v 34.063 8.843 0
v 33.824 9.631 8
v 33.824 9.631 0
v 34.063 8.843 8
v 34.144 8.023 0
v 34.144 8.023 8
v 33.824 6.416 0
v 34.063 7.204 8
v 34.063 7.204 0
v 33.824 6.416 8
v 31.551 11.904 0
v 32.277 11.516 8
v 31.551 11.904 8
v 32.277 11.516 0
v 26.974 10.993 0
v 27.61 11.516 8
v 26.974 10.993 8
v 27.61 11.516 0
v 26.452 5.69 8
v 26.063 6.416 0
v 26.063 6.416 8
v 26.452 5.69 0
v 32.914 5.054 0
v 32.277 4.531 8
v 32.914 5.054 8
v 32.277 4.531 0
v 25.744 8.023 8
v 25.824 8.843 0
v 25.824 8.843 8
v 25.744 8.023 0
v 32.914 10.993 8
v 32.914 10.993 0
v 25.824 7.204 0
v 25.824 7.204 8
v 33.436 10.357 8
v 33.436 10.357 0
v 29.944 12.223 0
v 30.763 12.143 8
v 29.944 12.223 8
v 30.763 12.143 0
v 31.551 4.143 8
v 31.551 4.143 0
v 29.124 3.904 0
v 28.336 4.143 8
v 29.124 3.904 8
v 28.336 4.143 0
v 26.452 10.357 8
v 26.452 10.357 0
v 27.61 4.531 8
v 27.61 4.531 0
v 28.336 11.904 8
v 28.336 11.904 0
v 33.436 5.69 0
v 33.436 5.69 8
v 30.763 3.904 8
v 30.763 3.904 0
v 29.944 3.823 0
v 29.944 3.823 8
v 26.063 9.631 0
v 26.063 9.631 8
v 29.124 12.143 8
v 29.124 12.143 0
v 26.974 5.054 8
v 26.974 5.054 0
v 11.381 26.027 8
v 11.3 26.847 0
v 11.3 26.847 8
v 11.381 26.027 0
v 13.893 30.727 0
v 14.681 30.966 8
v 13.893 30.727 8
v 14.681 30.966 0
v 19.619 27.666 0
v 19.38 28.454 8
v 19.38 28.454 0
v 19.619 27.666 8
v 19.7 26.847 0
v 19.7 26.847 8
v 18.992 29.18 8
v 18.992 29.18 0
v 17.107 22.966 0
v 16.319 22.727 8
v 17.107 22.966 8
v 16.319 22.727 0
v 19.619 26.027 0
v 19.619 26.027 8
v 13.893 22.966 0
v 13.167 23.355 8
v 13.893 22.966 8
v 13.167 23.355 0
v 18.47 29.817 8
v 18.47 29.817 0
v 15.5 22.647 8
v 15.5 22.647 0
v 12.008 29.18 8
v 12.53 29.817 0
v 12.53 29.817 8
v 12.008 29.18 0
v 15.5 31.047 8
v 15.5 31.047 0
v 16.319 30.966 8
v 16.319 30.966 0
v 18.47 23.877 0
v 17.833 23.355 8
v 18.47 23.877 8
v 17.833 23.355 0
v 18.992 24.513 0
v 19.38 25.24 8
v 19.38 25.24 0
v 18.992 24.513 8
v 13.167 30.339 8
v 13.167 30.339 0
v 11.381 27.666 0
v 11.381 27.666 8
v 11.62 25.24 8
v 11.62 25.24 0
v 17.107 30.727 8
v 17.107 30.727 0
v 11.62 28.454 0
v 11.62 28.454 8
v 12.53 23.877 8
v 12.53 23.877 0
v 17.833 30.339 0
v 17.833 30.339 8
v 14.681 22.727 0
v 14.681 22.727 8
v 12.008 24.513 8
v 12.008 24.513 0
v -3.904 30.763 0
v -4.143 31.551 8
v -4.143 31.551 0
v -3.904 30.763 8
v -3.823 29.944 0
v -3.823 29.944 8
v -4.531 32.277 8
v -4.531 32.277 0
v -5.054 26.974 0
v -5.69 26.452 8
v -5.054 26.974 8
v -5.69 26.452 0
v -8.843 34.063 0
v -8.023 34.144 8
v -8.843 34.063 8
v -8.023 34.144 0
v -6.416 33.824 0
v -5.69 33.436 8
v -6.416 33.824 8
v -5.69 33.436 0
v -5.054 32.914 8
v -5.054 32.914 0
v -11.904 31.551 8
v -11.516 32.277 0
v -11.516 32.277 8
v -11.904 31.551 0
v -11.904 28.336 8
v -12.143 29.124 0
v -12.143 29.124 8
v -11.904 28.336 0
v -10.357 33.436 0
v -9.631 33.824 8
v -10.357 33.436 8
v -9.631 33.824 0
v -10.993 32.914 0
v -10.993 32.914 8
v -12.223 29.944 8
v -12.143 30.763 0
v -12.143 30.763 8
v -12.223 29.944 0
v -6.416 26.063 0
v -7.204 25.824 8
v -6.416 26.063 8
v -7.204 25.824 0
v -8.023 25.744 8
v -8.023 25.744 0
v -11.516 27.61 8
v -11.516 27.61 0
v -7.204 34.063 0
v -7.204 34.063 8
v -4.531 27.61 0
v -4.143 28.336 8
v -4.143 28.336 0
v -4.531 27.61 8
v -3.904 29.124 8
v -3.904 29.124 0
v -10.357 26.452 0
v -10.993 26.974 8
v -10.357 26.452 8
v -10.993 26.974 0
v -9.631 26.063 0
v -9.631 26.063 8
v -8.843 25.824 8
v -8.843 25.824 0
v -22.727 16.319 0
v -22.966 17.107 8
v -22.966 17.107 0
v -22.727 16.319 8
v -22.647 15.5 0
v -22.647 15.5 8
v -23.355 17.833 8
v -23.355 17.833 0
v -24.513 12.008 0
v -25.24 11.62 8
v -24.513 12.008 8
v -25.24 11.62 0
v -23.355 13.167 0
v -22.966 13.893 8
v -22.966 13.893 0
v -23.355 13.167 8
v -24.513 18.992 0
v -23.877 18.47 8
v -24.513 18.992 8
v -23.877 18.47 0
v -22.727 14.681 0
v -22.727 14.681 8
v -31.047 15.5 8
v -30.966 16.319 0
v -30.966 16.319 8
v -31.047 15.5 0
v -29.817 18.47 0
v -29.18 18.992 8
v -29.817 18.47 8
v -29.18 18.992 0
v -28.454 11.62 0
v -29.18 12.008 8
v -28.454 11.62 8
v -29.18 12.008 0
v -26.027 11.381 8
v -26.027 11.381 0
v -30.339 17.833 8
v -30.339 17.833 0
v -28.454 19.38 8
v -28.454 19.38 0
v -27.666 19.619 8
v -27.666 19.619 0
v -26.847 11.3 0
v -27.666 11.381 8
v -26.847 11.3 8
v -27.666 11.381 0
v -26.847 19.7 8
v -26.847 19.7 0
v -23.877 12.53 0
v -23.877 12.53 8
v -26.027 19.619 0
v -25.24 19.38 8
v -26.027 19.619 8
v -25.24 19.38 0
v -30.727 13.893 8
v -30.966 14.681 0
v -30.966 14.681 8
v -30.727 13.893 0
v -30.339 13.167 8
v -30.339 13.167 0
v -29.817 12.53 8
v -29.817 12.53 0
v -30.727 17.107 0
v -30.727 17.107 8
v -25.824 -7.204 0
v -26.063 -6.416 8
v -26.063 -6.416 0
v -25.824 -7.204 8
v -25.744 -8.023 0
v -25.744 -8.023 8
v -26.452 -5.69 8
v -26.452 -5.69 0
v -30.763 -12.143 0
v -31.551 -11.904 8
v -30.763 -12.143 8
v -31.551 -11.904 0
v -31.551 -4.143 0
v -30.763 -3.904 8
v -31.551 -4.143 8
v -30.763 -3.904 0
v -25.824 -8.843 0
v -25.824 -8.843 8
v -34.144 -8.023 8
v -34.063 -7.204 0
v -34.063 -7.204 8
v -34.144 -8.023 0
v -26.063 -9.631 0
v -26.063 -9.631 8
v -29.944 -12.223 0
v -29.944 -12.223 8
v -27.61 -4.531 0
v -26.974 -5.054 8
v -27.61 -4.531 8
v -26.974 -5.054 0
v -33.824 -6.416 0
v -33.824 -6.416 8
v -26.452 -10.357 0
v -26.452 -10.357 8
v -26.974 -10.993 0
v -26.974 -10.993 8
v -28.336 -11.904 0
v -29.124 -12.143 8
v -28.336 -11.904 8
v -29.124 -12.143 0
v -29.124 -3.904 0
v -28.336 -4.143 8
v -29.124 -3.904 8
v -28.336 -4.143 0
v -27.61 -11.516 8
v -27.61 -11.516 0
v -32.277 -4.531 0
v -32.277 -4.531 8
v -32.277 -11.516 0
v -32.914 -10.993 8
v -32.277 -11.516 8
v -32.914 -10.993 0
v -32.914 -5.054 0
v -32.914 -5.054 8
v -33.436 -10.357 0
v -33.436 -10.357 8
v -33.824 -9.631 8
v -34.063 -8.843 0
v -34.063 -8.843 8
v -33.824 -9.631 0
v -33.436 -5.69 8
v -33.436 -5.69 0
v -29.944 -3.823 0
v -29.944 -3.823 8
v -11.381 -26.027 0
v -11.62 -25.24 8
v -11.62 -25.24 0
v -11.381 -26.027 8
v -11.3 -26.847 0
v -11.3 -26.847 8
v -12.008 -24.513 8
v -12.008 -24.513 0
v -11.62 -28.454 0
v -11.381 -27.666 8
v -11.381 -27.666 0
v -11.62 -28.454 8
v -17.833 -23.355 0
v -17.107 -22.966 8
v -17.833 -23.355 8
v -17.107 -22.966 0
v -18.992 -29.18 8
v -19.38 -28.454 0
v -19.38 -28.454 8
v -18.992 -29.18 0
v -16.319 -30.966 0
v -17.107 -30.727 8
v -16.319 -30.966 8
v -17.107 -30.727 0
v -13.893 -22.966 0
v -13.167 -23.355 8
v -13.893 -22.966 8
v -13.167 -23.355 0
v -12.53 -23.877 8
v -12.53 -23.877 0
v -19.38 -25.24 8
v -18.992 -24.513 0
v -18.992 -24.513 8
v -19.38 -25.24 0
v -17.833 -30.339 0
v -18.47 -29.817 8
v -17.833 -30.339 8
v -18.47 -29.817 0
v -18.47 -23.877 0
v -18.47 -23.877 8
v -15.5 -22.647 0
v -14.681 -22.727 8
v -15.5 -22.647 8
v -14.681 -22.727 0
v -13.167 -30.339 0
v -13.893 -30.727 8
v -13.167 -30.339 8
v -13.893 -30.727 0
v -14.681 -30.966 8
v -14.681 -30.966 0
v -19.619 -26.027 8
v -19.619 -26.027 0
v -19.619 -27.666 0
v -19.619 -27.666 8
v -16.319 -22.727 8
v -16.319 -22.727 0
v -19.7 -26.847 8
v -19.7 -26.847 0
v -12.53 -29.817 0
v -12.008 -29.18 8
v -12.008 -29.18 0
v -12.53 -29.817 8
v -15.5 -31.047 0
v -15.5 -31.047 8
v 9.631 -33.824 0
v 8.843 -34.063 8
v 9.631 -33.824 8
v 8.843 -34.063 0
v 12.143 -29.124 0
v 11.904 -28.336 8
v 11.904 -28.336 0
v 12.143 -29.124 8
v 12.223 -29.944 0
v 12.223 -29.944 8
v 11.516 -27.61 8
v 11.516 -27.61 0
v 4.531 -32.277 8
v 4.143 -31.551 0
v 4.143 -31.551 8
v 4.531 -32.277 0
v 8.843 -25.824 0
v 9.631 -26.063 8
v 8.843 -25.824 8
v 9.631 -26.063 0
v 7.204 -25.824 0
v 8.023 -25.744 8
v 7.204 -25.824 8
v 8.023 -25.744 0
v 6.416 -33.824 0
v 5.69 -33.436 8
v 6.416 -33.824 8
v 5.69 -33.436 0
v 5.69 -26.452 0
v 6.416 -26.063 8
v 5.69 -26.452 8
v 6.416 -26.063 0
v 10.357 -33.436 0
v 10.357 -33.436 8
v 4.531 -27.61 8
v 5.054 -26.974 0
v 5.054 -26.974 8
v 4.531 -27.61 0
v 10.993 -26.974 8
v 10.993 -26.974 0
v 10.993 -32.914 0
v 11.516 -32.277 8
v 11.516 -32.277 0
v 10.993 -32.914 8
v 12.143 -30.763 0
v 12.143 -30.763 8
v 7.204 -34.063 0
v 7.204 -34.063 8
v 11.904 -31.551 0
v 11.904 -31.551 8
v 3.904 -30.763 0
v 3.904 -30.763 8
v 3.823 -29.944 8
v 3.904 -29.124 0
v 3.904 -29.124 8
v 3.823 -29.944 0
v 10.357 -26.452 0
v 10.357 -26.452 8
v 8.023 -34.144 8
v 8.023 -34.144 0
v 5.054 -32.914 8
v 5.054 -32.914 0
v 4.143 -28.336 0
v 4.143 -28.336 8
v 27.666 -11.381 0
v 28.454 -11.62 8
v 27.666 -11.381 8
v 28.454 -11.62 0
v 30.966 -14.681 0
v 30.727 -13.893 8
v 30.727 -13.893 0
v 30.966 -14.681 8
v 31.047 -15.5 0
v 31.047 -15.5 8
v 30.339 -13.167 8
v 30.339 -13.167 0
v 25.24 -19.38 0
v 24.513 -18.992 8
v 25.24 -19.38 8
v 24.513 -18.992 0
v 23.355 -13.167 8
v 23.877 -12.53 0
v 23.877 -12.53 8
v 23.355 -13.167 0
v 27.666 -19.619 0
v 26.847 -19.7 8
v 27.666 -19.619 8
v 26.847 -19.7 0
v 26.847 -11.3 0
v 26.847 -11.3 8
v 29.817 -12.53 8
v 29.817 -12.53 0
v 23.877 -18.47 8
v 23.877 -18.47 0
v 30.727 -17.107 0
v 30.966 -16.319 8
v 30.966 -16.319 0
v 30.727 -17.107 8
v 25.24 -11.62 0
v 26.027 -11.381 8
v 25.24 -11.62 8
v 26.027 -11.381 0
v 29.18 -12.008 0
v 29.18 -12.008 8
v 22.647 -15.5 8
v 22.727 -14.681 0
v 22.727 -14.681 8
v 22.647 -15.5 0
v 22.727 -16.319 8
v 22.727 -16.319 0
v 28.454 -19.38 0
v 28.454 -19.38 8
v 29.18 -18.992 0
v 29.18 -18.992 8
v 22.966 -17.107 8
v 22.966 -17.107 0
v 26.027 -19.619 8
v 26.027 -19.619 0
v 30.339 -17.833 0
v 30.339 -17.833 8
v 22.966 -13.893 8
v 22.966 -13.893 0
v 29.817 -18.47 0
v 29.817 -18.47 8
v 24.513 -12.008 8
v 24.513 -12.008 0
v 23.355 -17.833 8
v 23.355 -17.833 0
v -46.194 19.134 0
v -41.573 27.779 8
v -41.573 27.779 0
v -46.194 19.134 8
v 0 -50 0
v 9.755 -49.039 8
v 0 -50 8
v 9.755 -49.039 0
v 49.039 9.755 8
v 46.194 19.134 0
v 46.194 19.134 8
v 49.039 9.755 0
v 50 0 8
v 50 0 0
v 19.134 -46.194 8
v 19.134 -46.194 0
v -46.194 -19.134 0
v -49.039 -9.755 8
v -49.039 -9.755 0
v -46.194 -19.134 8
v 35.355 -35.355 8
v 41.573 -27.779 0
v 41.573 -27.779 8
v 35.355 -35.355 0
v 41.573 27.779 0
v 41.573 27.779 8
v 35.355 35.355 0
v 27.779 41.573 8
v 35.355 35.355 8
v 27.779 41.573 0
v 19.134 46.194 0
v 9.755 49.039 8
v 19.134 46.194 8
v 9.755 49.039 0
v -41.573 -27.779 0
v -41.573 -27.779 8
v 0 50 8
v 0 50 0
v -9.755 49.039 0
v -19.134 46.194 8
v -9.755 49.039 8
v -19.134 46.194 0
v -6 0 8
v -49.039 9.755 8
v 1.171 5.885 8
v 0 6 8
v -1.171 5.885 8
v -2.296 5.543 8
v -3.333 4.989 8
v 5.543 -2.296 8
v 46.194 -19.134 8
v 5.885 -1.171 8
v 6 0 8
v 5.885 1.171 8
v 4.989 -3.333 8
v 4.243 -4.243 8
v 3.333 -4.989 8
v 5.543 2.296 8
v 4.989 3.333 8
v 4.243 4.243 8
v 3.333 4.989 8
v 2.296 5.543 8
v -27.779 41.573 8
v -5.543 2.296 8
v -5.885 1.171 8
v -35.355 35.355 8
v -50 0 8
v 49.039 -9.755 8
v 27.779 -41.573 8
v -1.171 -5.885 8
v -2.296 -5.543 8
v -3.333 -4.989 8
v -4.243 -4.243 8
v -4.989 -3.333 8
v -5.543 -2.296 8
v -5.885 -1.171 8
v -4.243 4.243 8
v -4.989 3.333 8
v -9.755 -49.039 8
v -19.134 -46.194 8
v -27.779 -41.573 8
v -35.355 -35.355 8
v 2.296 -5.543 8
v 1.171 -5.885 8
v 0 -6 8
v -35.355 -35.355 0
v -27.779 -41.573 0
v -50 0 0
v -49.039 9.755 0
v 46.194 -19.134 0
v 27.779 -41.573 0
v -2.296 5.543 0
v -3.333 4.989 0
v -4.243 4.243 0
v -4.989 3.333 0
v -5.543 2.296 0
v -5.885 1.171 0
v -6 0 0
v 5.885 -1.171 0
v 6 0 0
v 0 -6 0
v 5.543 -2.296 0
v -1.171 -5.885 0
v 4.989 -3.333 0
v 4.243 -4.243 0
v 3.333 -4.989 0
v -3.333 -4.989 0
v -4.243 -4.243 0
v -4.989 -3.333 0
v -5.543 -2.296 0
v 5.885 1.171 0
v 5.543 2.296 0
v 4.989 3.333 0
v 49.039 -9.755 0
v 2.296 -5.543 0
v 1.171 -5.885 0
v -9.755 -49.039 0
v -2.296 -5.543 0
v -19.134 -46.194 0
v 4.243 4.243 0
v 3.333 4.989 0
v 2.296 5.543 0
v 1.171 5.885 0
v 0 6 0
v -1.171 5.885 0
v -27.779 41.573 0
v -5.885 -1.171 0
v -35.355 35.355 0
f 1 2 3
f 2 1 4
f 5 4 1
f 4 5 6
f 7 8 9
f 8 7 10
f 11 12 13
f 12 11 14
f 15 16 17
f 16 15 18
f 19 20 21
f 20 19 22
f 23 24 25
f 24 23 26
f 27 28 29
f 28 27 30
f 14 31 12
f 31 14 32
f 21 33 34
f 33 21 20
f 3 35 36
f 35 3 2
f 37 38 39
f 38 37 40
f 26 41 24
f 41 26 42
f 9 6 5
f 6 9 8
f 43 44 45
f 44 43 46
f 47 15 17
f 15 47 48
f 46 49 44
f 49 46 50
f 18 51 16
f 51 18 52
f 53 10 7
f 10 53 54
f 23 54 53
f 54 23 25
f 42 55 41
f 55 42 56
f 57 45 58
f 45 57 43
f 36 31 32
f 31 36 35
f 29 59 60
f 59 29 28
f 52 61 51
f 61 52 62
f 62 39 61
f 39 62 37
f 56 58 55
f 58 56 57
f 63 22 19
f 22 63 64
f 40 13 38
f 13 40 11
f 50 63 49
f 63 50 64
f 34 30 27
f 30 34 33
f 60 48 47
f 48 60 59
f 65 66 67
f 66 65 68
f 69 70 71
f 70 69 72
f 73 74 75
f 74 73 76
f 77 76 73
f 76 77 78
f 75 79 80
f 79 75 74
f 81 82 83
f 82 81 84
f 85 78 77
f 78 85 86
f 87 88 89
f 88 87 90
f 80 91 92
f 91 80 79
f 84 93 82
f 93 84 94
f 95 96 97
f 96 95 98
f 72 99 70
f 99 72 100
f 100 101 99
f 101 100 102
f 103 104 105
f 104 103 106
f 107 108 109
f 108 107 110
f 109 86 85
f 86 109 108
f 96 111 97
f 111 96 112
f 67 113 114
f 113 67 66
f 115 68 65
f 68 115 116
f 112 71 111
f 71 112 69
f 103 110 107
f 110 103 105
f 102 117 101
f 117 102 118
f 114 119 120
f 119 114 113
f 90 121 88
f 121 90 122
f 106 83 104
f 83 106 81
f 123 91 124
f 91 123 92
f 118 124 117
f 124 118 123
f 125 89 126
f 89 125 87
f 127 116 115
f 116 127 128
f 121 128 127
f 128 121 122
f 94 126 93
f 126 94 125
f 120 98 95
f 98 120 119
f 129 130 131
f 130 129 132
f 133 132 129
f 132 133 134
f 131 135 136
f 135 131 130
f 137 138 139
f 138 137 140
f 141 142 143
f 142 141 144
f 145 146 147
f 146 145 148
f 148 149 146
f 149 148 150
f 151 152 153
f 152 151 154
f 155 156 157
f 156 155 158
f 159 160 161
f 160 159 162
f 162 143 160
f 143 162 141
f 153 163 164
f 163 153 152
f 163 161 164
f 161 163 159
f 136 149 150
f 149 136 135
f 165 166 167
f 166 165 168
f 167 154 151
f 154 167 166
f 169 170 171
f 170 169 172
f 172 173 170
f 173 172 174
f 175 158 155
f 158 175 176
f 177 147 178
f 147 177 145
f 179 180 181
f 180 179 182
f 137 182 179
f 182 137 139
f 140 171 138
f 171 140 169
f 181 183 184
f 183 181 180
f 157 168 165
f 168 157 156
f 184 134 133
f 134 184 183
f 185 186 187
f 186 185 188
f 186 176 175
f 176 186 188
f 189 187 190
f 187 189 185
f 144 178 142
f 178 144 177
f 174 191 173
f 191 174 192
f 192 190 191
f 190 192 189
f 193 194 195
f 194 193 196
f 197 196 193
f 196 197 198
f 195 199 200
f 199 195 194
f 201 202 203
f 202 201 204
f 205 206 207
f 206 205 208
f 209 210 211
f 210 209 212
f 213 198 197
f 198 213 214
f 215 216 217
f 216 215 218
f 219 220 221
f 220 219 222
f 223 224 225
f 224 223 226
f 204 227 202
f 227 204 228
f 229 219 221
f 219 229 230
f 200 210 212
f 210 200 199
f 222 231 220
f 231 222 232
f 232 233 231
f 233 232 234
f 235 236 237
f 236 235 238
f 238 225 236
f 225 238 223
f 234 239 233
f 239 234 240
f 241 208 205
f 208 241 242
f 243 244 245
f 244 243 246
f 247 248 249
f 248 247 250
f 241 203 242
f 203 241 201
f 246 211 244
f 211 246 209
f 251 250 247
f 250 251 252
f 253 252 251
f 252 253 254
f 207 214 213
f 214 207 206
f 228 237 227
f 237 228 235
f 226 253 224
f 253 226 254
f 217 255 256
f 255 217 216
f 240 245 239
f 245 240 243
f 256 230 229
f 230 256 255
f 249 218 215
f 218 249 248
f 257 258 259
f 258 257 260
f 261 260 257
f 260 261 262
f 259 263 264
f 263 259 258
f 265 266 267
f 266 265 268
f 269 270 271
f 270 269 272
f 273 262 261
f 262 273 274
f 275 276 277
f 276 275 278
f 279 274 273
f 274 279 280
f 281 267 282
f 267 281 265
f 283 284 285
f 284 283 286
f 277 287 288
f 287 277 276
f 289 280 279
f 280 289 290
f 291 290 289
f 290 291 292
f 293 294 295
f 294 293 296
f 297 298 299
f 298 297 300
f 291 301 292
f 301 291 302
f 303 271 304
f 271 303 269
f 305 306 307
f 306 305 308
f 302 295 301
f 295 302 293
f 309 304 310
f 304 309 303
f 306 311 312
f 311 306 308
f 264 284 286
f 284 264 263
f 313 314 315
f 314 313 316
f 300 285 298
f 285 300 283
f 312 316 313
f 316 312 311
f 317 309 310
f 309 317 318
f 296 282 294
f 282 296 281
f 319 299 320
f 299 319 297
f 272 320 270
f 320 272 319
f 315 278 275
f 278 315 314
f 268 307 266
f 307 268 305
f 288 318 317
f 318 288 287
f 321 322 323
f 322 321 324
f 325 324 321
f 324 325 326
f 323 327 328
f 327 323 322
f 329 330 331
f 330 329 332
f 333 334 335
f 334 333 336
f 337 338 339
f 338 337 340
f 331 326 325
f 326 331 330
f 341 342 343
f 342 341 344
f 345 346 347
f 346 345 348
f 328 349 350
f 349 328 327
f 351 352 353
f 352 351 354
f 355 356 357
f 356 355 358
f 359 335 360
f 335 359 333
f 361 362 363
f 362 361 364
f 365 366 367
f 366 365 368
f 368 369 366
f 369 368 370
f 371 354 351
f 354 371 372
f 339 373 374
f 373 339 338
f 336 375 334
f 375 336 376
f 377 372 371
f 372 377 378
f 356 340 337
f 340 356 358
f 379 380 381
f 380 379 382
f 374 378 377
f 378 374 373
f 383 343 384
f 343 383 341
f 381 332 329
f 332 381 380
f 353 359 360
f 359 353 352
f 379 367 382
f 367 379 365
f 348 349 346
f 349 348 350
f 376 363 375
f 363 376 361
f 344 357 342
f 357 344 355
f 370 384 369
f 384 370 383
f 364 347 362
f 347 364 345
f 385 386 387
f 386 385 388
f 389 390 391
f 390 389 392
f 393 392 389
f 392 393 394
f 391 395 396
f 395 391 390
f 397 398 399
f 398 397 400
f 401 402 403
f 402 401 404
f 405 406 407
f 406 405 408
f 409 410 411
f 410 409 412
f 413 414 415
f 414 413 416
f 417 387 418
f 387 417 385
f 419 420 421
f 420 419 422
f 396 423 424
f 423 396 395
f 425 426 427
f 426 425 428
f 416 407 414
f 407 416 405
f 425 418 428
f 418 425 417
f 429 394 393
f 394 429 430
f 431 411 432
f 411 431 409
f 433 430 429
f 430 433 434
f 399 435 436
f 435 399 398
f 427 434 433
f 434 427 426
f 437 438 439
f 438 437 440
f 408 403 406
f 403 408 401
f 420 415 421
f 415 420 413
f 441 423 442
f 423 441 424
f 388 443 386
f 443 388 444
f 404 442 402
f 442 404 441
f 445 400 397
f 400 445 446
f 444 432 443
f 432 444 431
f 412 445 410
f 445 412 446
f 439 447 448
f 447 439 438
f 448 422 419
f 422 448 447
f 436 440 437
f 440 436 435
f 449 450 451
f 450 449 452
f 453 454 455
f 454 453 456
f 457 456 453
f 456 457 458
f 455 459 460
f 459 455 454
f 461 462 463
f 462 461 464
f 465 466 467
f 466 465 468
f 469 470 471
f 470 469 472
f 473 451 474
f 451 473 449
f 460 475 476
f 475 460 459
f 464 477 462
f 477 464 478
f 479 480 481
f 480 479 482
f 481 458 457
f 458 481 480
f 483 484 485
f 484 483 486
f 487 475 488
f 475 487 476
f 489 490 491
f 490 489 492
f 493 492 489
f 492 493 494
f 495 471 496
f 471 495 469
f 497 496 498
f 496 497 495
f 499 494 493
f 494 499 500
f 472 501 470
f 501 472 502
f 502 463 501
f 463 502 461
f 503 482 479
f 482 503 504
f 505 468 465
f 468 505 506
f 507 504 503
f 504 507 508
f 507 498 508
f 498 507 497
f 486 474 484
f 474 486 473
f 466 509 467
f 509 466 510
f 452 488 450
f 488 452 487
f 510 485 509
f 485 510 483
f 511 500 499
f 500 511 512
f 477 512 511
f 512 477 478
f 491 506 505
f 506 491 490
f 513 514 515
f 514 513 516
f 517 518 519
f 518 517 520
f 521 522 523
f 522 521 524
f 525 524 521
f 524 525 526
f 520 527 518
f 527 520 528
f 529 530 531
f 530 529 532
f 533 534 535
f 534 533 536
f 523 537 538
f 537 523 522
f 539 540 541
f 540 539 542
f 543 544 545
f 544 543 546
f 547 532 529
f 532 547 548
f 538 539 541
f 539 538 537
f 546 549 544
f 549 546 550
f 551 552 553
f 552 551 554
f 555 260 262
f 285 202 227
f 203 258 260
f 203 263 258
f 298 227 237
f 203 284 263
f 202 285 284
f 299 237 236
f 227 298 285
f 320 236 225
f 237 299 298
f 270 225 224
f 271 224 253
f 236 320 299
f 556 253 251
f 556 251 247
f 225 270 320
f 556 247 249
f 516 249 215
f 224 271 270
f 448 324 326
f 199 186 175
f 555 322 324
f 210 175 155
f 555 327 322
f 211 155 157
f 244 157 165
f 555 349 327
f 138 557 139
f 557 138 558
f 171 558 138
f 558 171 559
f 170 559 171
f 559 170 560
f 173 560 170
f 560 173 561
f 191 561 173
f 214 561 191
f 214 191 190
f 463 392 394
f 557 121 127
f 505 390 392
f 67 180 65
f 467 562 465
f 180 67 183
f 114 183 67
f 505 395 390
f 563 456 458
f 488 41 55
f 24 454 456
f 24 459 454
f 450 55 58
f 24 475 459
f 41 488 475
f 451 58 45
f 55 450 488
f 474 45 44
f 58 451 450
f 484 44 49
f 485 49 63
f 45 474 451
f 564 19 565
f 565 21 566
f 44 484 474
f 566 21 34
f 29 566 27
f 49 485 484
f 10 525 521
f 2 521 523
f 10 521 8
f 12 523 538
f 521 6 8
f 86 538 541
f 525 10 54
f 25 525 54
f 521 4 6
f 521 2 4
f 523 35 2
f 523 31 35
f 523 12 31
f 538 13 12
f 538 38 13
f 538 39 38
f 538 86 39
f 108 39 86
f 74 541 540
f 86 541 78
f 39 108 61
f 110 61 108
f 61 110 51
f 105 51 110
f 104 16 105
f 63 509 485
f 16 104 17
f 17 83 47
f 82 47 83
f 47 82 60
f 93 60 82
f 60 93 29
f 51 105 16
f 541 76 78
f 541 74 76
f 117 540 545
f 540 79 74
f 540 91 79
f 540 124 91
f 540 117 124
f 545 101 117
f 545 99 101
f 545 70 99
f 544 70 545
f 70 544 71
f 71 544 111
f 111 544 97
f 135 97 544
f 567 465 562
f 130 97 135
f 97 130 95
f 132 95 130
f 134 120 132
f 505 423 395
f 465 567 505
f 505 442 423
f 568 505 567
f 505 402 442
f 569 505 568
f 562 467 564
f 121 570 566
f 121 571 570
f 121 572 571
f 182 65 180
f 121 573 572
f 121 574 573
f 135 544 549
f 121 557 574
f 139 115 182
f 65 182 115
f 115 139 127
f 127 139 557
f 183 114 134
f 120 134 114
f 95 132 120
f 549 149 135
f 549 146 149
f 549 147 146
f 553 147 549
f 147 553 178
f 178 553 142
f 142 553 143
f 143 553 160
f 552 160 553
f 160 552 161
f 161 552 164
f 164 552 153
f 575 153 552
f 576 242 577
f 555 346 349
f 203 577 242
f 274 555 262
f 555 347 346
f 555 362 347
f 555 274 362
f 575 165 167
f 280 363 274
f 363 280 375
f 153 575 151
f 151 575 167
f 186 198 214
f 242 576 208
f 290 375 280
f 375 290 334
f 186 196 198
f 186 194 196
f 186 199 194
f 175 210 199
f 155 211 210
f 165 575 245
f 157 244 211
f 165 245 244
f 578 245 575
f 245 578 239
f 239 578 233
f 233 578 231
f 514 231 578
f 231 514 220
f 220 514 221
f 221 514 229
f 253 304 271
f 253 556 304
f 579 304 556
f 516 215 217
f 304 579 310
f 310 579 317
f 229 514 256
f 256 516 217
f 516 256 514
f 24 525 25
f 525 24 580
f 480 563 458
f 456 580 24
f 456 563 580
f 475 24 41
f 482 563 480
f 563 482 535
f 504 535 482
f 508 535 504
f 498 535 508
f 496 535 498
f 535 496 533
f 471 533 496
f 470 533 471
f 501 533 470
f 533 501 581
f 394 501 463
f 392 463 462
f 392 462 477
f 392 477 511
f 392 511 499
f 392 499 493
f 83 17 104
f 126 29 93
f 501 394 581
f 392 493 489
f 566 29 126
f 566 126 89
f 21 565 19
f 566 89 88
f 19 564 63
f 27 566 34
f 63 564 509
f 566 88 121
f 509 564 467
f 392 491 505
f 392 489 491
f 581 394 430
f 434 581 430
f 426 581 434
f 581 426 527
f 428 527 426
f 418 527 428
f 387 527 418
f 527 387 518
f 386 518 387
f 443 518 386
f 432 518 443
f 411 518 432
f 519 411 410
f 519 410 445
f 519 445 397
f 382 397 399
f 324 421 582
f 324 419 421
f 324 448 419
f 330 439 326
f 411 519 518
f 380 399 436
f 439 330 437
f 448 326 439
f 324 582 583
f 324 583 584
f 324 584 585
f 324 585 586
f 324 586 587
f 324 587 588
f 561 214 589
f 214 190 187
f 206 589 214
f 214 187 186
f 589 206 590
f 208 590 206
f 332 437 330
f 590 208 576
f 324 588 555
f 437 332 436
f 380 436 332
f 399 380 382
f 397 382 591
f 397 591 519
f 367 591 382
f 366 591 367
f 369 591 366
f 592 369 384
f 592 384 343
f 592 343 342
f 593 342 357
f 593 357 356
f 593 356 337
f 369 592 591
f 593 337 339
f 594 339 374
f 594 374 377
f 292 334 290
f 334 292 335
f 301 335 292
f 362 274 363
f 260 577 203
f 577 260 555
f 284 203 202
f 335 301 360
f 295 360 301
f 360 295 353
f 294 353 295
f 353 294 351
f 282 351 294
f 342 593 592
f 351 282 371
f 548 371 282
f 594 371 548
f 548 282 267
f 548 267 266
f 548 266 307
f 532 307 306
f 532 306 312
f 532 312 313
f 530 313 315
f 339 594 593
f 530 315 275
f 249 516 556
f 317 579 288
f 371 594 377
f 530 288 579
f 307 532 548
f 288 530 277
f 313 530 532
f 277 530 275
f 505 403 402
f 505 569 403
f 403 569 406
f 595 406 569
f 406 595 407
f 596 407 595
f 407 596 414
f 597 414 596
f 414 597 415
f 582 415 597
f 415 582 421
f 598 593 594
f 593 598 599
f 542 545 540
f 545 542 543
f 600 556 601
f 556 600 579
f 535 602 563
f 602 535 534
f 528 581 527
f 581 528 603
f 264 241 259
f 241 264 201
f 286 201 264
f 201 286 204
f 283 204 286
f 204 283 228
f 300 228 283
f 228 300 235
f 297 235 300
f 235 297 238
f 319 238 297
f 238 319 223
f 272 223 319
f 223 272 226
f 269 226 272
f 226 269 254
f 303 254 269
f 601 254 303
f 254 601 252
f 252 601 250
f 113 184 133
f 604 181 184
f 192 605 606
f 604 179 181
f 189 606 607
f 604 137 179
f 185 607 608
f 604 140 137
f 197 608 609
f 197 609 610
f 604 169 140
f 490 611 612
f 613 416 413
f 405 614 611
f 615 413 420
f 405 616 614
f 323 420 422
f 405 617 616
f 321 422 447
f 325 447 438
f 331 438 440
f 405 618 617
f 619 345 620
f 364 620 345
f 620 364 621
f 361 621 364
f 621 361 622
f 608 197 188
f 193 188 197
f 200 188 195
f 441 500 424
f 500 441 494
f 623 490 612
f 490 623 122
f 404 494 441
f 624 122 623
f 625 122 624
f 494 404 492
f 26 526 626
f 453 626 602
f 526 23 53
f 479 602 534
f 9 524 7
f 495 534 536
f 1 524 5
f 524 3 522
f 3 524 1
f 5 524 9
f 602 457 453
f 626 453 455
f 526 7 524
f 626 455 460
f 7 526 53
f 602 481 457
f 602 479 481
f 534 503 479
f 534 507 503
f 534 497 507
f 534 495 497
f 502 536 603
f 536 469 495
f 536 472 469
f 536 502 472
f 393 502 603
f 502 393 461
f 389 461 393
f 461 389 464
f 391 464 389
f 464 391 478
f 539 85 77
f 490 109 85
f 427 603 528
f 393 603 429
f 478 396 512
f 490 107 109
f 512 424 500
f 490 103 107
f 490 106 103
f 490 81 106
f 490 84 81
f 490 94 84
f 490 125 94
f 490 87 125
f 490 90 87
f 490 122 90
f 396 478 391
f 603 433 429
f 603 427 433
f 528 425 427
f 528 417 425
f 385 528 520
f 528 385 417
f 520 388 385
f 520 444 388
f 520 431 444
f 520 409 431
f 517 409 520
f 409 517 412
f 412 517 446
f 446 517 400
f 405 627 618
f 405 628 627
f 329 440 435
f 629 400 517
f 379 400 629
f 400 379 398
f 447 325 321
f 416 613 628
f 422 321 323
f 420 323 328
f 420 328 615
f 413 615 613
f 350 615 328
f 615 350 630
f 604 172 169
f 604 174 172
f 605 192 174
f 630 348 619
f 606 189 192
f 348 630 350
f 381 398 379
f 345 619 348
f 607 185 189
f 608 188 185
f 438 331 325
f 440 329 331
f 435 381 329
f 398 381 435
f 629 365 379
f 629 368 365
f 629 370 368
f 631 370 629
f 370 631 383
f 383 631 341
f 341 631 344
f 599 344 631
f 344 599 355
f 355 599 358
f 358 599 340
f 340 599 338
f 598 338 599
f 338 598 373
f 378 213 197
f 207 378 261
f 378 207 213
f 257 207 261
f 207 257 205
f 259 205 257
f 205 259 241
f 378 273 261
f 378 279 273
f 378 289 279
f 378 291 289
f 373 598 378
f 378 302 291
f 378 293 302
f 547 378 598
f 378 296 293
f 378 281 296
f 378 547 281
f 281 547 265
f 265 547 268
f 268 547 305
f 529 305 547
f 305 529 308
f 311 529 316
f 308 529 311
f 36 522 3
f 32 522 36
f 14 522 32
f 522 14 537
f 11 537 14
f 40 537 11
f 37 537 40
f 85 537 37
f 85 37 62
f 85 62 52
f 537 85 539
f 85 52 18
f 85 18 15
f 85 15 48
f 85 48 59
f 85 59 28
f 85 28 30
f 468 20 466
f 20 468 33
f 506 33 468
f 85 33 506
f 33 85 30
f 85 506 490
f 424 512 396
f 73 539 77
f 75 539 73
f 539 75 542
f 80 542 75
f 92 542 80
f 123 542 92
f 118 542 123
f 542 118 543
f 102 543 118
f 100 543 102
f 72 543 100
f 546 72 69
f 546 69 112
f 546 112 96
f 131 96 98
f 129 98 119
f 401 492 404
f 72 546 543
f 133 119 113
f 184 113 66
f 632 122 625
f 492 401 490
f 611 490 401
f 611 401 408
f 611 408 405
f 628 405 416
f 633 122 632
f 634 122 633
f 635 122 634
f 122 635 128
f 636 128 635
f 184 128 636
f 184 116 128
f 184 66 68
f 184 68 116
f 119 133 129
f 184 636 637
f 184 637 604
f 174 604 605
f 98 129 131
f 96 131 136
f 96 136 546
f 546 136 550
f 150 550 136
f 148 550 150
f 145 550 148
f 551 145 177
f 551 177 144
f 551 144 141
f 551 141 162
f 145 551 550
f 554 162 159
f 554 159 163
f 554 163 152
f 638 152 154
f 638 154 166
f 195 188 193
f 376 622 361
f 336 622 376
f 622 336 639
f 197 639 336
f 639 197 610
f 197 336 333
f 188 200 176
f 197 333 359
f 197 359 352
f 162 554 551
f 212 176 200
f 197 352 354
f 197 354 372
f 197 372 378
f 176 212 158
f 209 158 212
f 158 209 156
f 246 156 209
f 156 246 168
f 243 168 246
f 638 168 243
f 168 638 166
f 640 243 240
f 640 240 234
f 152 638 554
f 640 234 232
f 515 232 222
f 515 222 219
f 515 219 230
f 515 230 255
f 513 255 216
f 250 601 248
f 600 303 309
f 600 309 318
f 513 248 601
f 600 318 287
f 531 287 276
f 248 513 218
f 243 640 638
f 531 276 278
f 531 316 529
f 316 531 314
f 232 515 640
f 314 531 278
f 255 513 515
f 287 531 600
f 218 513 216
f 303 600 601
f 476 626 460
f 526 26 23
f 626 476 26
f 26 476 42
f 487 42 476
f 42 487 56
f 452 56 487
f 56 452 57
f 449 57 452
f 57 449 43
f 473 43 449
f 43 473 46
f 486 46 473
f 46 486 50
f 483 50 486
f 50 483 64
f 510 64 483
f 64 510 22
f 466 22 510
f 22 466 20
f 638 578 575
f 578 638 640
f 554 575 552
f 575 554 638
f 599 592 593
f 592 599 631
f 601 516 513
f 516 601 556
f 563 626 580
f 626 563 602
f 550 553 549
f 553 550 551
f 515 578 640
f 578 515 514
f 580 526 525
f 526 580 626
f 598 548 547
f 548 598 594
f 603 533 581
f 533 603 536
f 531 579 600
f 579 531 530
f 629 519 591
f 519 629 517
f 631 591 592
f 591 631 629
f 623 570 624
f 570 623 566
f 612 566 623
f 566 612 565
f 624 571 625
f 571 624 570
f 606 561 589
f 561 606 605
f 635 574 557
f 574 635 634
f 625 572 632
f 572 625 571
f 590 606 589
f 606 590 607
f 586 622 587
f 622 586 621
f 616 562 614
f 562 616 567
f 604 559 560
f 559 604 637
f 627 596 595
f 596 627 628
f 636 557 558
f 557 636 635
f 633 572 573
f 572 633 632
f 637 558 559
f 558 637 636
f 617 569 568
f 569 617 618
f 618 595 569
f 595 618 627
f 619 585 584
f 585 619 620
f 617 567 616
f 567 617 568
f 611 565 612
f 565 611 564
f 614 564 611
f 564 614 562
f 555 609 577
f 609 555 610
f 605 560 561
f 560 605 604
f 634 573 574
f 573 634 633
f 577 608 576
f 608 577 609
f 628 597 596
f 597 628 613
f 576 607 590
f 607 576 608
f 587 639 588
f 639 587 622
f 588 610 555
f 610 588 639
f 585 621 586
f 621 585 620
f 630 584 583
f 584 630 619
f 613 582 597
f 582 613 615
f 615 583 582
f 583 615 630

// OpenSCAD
$fn = 32;

// ----------------------------------------------------------------------
// Flange Ø100 x 8
// 8 holes on a Ø62 bolt circle, bolted joints
// ----------------------------------------------------------------------

// --- parameters (mm) ---
flange_d = 100;  // outside diameter of the flange
thickness = 8;   // flange thickness
holes = 8;       // number of bolt holes
pcd = 62;        // bolt circle diameter
start_deg = 15;  // angle of the first hole, from +X
hole_d = 8.4;    // bolt hole diameter
bore_d = 12;     // central through bore
hub_d = 24;      // hub outside diameter
hub_h = 0;       // hub height above the flange face (0 = no hub)

// --- derived feature positions (mm) ---
height = thickness + hub_h;  // = 8   overall height of the part
pcd_r = pcd / 2;             // = 31   bolt circle radius
hole_step = 360 / holes;     // = 45   angular pitch
feature_centers = [
  [pcd_r * cos(start_deg + 0 * hole_step), pcd_r * sin(start_deg + 0 * hole_step)],
  [pcd_r * cos(start_deg + 1 * hole_step), pcd_r * sin(start_deg + 1 * hole_step)],
  [pcd_r * cos(start_deg + 2 * hole_step), pcd_r * sin(start_deg + 2 * hole_step)],
  [pcd_r * cos(start_deg + 3 * hole_step), pcd_r * sin(start_deg + 3 * hole_step)],
  [pcd_r * cos(start_deg + 4 * hole_step), pcd_r * sin(start_deg + 4 * hole_step)],
  [pcd_r * cos(start_deg + 5 * hole_step), pcd_r * sin(start_deg + 5 * hole_step)],
  [pcd_r * cos(start_deg + 6 * hole_step), pcd_r * sin(start_deg + 6 * hole_step)],
  [pcd_r * cos(start_deg + 7 * hole_step), pcd_r * sin(start_deg + 7 * hole_step)]
];   // bolt hole centres on the pitch circle

// flange disc, every hole and the bore cut straight through
difference() {
  union() {
    cylinder(d = flange_d, h = thickness);
  }
  translate([0, 0, -1]) cylinder(d = bore_d, h = height + 2);  // bore, through
  for (centre = feature_centers)
    translate([centre[0], centre[1], -1]) cylinder(d = hole_d, h = thickness + 2);
}
